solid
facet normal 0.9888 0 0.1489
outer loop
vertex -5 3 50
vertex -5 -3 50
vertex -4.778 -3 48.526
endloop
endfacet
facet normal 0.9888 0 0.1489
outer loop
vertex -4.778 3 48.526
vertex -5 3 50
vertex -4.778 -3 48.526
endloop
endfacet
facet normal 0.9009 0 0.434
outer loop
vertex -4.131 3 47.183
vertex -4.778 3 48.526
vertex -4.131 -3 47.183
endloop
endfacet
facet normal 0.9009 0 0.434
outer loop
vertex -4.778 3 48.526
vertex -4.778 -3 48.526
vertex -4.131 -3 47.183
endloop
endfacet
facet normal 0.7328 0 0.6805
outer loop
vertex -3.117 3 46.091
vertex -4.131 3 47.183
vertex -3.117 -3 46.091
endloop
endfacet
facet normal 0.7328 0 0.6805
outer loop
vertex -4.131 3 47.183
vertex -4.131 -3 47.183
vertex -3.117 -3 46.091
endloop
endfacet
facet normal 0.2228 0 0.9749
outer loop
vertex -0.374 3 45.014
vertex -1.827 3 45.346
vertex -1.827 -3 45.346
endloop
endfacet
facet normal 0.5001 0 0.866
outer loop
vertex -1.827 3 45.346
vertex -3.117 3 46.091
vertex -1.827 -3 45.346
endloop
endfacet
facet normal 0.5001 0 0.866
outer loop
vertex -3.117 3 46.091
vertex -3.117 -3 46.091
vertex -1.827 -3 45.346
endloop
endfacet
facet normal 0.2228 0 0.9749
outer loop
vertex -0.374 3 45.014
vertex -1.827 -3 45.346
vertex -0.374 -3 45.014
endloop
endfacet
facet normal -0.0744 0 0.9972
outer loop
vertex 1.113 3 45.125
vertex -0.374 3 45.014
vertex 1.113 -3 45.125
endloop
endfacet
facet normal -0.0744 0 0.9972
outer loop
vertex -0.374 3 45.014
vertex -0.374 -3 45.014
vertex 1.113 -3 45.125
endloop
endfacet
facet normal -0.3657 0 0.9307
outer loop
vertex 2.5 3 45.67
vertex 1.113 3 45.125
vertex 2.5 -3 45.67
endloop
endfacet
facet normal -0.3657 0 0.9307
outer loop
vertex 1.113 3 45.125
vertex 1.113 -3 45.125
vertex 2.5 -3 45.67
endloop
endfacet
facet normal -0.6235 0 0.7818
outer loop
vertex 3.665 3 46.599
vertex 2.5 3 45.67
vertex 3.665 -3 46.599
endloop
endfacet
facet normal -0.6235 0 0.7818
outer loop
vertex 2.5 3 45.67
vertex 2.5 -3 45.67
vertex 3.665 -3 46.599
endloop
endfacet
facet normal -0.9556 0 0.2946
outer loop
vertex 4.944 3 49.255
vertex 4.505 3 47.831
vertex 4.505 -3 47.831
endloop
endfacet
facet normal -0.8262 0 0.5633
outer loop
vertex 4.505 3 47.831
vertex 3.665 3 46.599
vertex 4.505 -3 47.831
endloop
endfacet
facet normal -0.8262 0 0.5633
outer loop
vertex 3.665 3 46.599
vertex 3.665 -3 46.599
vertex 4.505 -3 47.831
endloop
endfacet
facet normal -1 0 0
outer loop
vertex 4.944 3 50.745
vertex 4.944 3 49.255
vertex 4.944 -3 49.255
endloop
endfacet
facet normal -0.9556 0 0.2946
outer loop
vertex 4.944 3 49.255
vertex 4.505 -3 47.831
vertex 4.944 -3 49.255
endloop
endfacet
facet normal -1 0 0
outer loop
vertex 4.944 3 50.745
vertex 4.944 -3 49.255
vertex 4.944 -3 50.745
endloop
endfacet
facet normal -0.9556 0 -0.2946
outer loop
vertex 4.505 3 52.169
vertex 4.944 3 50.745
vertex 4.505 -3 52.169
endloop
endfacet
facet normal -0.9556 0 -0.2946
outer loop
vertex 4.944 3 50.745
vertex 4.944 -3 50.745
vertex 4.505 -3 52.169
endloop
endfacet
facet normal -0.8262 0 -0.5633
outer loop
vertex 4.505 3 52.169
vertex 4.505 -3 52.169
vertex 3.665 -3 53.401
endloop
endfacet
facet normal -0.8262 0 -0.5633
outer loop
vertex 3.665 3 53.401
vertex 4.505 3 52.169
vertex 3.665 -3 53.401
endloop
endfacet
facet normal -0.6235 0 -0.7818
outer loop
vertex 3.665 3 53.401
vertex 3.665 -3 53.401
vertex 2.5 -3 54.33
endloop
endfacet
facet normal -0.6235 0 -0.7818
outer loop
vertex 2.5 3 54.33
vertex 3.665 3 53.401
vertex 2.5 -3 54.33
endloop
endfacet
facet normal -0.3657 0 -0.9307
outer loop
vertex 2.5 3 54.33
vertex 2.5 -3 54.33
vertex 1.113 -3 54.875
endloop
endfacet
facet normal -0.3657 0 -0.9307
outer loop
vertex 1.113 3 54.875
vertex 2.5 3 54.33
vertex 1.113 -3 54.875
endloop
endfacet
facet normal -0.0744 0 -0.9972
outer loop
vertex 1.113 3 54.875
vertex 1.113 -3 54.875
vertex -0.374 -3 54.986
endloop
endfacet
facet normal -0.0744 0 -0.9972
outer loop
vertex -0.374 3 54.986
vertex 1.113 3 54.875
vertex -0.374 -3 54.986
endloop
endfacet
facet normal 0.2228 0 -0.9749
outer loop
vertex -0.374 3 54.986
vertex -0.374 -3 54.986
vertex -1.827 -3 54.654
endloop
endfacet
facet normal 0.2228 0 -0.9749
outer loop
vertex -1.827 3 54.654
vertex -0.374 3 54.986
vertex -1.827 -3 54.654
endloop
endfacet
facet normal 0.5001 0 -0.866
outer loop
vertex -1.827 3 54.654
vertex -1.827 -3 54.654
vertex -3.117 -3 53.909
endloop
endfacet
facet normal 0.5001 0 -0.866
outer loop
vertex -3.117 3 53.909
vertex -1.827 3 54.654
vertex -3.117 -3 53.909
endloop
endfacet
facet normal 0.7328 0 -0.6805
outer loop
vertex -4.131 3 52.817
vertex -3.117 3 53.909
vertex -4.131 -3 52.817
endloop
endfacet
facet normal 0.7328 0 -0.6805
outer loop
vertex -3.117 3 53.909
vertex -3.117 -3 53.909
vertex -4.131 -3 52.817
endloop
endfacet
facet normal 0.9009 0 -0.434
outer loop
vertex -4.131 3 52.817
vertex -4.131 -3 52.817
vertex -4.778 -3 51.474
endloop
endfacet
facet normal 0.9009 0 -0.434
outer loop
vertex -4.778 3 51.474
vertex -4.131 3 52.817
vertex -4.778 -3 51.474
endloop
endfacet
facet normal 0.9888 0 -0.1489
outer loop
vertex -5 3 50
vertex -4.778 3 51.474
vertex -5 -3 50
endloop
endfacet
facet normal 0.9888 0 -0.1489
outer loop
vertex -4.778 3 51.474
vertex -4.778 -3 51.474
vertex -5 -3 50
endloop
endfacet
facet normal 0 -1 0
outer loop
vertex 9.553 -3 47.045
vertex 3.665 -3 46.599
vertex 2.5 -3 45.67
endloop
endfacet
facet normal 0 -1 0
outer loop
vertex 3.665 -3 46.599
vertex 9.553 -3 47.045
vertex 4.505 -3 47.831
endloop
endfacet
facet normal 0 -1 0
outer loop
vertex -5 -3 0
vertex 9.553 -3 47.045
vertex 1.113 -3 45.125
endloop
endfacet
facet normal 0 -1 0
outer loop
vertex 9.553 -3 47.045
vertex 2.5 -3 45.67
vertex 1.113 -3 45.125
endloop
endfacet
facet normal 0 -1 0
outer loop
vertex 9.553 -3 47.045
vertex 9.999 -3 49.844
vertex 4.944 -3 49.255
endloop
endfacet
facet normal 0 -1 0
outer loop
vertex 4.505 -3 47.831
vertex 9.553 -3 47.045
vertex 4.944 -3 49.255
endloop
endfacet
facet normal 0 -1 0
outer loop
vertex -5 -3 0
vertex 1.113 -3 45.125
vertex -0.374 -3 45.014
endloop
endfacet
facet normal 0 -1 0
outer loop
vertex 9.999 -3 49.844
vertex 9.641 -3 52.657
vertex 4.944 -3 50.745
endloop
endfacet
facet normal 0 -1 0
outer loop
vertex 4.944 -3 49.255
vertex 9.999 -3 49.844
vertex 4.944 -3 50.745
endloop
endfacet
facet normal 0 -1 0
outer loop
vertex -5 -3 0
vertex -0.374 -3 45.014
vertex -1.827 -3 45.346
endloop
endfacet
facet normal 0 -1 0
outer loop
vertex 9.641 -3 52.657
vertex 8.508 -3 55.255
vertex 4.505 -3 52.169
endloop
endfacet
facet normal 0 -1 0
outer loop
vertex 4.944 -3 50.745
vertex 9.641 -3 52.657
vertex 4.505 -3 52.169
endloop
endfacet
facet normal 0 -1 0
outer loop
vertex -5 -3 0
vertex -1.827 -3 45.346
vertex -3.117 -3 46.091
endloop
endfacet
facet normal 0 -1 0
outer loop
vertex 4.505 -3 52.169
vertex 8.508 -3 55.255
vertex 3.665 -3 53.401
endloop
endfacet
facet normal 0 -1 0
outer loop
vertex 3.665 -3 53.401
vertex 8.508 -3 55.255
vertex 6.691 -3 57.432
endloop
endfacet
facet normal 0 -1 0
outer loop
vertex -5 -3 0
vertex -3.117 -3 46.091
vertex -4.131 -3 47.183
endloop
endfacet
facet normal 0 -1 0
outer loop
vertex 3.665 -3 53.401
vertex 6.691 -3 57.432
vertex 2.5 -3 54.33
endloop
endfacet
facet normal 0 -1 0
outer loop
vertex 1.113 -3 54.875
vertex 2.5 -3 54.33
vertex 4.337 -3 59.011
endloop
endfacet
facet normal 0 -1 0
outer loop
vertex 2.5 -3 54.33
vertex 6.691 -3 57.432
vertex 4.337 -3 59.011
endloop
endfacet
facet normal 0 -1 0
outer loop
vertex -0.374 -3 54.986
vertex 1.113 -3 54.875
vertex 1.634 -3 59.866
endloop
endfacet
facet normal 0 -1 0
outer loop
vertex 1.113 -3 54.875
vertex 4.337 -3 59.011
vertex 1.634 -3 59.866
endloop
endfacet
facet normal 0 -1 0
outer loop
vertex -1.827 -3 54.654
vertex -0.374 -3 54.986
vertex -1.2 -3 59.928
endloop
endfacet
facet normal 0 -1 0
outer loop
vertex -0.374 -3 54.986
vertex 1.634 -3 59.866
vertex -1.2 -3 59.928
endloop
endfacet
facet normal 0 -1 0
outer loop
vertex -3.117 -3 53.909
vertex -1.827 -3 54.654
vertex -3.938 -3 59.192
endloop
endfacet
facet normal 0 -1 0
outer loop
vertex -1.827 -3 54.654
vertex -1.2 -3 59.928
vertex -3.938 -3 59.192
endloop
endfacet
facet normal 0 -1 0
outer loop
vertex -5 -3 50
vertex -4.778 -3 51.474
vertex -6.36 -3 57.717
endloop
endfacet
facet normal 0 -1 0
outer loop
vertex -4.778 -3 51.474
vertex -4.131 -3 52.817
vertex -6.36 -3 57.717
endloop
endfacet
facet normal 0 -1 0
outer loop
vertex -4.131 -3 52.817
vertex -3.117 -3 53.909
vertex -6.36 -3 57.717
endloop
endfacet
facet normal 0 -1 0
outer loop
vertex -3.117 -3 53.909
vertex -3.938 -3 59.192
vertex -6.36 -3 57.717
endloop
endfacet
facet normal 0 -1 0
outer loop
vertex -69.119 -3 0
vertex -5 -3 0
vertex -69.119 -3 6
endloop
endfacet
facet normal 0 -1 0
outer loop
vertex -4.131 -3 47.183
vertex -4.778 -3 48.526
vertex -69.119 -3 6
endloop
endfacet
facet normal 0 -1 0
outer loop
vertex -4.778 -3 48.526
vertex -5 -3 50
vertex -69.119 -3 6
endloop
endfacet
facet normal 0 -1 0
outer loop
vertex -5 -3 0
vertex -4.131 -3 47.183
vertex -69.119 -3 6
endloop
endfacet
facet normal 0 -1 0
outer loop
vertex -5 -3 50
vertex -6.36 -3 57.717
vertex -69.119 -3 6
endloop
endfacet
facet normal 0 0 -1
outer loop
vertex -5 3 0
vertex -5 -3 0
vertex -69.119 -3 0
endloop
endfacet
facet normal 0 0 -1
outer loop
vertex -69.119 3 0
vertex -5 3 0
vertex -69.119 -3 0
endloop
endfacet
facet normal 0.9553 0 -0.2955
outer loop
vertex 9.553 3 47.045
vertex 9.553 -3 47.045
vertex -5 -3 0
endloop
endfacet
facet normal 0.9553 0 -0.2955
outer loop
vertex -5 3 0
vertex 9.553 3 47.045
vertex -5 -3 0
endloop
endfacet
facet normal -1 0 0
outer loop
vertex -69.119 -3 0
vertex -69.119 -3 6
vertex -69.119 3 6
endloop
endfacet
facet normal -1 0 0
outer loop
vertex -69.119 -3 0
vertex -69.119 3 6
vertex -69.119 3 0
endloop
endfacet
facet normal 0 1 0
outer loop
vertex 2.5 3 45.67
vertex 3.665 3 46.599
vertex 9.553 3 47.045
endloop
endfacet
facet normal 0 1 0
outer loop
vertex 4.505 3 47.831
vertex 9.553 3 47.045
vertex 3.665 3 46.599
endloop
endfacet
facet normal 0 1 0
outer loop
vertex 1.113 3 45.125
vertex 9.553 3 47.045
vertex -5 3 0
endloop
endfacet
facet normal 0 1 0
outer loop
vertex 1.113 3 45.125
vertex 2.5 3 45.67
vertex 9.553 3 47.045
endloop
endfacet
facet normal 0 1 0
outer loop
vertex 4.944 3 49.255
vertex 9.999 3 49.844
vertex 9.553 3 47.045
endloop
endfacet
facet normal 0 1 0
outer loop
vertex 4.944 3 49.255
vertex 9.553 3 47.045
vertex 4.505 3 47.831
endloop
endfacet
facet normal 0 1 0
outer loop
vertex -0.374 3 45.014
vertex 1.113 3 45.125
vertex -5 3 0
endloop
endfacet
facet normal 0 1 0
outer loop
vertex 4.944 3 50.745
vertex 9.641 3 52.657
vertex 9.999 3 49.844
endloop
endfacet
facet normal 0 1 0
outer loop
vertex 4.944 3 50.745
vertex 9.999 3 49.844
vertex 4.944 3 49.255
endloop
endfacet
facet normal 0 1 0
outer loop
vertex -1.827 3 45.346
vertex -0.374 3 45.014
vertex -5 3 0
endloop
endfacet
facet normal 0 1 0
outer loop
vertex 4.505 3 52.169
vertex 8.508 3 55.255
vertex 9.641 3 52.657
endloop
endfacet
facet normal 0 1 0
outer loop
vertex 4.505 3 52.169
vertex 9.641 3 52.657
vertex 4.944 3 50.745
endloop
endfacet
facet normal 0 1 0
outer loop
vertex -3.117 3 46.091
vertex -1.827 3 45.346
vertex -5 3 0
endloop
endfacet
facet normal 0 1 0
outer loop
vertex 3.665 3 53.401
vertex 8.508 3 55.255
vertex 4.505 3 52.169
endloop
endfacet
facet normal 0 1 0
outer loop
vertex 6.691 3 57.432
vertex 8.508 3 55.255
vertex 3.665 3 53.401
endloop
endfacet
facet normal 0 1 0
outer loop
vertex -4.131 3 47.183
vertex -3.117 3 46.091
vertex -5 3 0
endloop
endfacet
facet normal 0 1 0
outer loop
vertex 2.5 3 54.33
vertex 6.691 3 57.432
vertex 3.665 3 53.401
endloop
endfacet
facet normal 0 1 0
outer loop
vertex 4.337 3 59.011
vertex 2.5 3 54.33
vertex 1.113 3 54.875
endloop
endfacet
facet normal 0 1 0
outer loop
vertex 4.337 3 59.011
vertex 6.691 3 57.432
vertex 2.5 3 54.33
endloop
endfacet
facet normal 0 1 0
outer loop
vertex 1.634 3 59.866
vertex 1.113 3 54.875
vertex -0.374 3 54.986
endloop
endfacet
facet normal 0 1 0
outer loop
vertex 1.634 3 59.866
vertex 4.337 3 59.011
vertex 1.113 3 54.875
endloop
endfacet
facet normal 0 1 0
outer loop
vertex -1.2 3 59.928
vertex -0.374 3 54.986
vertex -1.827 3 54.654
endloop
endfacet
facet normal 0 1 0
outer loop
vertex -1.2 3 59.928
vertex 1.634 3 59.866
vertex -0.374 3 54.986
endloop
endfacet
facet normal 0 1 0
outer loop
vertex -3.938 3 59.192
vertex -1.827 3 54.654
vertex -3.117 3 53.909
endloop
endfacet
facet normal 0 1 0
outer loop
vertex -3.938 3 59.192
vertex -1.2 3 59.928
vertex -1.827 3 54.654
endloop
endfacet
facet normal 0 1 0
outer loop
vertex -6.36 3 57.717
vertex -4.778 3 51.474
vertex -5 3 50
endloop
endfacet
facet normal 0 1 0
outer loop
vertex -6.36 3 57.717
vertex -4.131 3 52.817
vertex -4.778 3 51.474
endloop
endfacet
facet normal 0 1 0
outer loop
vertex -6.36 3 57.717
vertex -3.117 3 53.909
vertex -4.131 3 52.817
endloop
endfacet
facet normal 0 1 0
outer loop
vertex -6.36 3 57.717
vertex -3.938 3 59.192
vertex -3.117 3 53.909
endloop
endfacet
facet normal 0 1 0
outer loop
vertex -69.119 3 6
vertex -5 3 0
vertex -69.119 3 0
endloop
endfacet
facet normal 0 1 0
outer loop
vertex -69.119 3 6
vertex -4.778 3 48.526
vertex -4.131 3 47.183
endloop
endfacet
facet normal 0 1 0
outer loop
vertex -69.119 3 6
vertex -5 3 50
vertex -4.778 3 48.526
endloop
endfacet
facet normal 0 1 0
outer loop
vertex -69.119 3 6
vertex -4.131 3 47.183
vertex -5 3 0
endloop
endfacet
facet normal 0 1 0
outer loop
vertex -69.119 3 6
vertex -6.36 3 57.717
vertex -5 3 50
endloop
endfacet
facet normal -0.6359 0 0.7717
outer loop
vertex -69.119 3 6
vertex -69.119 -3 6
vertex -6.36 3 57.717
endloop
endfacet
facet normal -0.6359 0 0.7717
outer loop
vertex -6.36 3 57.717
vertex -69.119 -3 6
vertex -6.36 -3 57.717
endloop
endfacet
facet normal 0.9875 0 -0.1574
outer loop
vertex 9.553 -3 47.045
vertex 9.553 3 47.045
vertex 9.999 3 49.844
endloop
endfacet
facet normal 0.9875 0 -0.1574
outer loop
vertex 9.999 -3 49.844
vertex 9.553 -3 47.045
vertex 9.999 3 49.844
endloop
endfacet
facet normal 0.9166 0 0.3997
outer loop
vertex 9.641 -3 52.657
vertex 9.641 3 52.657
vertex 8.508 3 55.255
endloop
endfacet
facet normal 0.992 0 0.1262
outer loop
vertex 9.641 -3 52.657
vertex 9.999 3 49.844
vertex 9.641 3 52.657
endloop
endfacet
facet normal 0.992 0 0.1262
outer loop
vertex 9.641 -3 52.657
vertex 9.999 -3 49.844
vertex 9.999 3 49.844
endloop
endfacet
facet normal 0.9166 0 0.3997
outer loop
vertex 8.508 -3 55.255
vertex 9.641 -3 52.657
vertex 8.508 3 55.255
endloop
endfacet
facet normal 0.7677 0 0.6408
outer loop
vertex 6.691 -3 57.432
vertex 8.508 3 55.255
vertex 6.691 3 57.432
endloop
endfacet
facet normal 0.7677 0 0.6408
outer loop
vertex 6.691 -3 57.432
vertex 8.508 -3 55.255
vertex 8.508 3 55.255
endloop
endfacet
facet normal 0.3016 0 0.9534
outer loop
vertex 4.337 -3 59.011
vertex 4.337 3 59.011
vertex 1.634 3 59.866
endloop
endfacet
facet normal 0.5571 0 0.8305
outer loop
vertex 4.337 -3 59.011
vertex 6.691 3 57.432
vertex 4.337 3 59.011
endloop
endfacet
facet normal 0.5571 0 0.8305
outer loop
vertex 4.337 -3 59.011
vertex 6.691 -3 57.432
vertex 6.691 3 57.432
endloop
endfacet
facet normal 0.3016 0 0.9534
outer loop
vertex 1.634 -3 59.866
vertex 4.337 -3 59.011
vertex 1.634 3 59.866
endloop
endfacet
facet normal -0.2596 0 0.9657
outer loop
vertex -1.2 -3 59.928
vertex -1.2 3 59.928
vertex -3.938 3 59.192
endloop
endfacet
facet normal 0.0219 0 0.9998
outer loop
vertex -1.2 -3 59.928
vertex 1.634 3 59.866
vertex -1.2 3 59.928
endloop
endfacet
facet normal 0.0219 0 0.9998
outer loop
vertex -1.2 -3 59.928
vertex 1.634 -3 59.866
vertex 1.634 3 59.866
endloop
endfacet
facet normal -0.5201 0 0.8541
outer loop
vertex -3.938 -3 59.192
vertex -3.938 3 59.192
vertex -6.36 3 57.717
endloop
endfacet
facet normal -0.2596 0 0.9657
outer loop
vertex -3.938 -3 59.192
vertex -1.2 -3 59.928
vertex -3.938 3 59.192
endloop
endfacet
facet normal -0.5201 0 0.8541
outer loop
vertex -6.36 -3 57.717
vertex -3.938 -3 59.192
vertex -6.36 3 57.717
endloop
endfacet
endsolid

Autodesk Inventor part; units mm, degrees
ref_plane "YZ Plane" through (0, 0, 0) normal (1, 0, 0) x (0, 1, 0)
ref_plane "XZ Plane" through (0, 0, 0) normal (0, 1, 0) x (-1, 0, 0)
ref_plane "XY Plane" through (0, 0, 0) normal (0, 0, 1) x (1, 0, 0)
sketch "Sketch1" plane through (0, 0, 0) normal (0, 1, 0) x (-1, 0, 0)
  circle A0 centre (0, 50) radius 5
  circle A1 centre (0, 50) radius 10
  line L0 (-9.5533, 47.0447) -> (5, 0)
  line L1 (5, 0) -> (69.1187, 0)
  line L2 (69.1187, 6) -> (69.1187, 0) projected
  line L3 (69.1187, 6) -> (6.3595, 57.7173)
  point P0 (0, 0)
  dimension "d0" = 10
  dimension "d1" = 50
  dimension "d2" = 20
extrude "Extrusion1" add sketch "Sketch1" along normal mid plane 6
properties part number "Soporte resorte freno"
